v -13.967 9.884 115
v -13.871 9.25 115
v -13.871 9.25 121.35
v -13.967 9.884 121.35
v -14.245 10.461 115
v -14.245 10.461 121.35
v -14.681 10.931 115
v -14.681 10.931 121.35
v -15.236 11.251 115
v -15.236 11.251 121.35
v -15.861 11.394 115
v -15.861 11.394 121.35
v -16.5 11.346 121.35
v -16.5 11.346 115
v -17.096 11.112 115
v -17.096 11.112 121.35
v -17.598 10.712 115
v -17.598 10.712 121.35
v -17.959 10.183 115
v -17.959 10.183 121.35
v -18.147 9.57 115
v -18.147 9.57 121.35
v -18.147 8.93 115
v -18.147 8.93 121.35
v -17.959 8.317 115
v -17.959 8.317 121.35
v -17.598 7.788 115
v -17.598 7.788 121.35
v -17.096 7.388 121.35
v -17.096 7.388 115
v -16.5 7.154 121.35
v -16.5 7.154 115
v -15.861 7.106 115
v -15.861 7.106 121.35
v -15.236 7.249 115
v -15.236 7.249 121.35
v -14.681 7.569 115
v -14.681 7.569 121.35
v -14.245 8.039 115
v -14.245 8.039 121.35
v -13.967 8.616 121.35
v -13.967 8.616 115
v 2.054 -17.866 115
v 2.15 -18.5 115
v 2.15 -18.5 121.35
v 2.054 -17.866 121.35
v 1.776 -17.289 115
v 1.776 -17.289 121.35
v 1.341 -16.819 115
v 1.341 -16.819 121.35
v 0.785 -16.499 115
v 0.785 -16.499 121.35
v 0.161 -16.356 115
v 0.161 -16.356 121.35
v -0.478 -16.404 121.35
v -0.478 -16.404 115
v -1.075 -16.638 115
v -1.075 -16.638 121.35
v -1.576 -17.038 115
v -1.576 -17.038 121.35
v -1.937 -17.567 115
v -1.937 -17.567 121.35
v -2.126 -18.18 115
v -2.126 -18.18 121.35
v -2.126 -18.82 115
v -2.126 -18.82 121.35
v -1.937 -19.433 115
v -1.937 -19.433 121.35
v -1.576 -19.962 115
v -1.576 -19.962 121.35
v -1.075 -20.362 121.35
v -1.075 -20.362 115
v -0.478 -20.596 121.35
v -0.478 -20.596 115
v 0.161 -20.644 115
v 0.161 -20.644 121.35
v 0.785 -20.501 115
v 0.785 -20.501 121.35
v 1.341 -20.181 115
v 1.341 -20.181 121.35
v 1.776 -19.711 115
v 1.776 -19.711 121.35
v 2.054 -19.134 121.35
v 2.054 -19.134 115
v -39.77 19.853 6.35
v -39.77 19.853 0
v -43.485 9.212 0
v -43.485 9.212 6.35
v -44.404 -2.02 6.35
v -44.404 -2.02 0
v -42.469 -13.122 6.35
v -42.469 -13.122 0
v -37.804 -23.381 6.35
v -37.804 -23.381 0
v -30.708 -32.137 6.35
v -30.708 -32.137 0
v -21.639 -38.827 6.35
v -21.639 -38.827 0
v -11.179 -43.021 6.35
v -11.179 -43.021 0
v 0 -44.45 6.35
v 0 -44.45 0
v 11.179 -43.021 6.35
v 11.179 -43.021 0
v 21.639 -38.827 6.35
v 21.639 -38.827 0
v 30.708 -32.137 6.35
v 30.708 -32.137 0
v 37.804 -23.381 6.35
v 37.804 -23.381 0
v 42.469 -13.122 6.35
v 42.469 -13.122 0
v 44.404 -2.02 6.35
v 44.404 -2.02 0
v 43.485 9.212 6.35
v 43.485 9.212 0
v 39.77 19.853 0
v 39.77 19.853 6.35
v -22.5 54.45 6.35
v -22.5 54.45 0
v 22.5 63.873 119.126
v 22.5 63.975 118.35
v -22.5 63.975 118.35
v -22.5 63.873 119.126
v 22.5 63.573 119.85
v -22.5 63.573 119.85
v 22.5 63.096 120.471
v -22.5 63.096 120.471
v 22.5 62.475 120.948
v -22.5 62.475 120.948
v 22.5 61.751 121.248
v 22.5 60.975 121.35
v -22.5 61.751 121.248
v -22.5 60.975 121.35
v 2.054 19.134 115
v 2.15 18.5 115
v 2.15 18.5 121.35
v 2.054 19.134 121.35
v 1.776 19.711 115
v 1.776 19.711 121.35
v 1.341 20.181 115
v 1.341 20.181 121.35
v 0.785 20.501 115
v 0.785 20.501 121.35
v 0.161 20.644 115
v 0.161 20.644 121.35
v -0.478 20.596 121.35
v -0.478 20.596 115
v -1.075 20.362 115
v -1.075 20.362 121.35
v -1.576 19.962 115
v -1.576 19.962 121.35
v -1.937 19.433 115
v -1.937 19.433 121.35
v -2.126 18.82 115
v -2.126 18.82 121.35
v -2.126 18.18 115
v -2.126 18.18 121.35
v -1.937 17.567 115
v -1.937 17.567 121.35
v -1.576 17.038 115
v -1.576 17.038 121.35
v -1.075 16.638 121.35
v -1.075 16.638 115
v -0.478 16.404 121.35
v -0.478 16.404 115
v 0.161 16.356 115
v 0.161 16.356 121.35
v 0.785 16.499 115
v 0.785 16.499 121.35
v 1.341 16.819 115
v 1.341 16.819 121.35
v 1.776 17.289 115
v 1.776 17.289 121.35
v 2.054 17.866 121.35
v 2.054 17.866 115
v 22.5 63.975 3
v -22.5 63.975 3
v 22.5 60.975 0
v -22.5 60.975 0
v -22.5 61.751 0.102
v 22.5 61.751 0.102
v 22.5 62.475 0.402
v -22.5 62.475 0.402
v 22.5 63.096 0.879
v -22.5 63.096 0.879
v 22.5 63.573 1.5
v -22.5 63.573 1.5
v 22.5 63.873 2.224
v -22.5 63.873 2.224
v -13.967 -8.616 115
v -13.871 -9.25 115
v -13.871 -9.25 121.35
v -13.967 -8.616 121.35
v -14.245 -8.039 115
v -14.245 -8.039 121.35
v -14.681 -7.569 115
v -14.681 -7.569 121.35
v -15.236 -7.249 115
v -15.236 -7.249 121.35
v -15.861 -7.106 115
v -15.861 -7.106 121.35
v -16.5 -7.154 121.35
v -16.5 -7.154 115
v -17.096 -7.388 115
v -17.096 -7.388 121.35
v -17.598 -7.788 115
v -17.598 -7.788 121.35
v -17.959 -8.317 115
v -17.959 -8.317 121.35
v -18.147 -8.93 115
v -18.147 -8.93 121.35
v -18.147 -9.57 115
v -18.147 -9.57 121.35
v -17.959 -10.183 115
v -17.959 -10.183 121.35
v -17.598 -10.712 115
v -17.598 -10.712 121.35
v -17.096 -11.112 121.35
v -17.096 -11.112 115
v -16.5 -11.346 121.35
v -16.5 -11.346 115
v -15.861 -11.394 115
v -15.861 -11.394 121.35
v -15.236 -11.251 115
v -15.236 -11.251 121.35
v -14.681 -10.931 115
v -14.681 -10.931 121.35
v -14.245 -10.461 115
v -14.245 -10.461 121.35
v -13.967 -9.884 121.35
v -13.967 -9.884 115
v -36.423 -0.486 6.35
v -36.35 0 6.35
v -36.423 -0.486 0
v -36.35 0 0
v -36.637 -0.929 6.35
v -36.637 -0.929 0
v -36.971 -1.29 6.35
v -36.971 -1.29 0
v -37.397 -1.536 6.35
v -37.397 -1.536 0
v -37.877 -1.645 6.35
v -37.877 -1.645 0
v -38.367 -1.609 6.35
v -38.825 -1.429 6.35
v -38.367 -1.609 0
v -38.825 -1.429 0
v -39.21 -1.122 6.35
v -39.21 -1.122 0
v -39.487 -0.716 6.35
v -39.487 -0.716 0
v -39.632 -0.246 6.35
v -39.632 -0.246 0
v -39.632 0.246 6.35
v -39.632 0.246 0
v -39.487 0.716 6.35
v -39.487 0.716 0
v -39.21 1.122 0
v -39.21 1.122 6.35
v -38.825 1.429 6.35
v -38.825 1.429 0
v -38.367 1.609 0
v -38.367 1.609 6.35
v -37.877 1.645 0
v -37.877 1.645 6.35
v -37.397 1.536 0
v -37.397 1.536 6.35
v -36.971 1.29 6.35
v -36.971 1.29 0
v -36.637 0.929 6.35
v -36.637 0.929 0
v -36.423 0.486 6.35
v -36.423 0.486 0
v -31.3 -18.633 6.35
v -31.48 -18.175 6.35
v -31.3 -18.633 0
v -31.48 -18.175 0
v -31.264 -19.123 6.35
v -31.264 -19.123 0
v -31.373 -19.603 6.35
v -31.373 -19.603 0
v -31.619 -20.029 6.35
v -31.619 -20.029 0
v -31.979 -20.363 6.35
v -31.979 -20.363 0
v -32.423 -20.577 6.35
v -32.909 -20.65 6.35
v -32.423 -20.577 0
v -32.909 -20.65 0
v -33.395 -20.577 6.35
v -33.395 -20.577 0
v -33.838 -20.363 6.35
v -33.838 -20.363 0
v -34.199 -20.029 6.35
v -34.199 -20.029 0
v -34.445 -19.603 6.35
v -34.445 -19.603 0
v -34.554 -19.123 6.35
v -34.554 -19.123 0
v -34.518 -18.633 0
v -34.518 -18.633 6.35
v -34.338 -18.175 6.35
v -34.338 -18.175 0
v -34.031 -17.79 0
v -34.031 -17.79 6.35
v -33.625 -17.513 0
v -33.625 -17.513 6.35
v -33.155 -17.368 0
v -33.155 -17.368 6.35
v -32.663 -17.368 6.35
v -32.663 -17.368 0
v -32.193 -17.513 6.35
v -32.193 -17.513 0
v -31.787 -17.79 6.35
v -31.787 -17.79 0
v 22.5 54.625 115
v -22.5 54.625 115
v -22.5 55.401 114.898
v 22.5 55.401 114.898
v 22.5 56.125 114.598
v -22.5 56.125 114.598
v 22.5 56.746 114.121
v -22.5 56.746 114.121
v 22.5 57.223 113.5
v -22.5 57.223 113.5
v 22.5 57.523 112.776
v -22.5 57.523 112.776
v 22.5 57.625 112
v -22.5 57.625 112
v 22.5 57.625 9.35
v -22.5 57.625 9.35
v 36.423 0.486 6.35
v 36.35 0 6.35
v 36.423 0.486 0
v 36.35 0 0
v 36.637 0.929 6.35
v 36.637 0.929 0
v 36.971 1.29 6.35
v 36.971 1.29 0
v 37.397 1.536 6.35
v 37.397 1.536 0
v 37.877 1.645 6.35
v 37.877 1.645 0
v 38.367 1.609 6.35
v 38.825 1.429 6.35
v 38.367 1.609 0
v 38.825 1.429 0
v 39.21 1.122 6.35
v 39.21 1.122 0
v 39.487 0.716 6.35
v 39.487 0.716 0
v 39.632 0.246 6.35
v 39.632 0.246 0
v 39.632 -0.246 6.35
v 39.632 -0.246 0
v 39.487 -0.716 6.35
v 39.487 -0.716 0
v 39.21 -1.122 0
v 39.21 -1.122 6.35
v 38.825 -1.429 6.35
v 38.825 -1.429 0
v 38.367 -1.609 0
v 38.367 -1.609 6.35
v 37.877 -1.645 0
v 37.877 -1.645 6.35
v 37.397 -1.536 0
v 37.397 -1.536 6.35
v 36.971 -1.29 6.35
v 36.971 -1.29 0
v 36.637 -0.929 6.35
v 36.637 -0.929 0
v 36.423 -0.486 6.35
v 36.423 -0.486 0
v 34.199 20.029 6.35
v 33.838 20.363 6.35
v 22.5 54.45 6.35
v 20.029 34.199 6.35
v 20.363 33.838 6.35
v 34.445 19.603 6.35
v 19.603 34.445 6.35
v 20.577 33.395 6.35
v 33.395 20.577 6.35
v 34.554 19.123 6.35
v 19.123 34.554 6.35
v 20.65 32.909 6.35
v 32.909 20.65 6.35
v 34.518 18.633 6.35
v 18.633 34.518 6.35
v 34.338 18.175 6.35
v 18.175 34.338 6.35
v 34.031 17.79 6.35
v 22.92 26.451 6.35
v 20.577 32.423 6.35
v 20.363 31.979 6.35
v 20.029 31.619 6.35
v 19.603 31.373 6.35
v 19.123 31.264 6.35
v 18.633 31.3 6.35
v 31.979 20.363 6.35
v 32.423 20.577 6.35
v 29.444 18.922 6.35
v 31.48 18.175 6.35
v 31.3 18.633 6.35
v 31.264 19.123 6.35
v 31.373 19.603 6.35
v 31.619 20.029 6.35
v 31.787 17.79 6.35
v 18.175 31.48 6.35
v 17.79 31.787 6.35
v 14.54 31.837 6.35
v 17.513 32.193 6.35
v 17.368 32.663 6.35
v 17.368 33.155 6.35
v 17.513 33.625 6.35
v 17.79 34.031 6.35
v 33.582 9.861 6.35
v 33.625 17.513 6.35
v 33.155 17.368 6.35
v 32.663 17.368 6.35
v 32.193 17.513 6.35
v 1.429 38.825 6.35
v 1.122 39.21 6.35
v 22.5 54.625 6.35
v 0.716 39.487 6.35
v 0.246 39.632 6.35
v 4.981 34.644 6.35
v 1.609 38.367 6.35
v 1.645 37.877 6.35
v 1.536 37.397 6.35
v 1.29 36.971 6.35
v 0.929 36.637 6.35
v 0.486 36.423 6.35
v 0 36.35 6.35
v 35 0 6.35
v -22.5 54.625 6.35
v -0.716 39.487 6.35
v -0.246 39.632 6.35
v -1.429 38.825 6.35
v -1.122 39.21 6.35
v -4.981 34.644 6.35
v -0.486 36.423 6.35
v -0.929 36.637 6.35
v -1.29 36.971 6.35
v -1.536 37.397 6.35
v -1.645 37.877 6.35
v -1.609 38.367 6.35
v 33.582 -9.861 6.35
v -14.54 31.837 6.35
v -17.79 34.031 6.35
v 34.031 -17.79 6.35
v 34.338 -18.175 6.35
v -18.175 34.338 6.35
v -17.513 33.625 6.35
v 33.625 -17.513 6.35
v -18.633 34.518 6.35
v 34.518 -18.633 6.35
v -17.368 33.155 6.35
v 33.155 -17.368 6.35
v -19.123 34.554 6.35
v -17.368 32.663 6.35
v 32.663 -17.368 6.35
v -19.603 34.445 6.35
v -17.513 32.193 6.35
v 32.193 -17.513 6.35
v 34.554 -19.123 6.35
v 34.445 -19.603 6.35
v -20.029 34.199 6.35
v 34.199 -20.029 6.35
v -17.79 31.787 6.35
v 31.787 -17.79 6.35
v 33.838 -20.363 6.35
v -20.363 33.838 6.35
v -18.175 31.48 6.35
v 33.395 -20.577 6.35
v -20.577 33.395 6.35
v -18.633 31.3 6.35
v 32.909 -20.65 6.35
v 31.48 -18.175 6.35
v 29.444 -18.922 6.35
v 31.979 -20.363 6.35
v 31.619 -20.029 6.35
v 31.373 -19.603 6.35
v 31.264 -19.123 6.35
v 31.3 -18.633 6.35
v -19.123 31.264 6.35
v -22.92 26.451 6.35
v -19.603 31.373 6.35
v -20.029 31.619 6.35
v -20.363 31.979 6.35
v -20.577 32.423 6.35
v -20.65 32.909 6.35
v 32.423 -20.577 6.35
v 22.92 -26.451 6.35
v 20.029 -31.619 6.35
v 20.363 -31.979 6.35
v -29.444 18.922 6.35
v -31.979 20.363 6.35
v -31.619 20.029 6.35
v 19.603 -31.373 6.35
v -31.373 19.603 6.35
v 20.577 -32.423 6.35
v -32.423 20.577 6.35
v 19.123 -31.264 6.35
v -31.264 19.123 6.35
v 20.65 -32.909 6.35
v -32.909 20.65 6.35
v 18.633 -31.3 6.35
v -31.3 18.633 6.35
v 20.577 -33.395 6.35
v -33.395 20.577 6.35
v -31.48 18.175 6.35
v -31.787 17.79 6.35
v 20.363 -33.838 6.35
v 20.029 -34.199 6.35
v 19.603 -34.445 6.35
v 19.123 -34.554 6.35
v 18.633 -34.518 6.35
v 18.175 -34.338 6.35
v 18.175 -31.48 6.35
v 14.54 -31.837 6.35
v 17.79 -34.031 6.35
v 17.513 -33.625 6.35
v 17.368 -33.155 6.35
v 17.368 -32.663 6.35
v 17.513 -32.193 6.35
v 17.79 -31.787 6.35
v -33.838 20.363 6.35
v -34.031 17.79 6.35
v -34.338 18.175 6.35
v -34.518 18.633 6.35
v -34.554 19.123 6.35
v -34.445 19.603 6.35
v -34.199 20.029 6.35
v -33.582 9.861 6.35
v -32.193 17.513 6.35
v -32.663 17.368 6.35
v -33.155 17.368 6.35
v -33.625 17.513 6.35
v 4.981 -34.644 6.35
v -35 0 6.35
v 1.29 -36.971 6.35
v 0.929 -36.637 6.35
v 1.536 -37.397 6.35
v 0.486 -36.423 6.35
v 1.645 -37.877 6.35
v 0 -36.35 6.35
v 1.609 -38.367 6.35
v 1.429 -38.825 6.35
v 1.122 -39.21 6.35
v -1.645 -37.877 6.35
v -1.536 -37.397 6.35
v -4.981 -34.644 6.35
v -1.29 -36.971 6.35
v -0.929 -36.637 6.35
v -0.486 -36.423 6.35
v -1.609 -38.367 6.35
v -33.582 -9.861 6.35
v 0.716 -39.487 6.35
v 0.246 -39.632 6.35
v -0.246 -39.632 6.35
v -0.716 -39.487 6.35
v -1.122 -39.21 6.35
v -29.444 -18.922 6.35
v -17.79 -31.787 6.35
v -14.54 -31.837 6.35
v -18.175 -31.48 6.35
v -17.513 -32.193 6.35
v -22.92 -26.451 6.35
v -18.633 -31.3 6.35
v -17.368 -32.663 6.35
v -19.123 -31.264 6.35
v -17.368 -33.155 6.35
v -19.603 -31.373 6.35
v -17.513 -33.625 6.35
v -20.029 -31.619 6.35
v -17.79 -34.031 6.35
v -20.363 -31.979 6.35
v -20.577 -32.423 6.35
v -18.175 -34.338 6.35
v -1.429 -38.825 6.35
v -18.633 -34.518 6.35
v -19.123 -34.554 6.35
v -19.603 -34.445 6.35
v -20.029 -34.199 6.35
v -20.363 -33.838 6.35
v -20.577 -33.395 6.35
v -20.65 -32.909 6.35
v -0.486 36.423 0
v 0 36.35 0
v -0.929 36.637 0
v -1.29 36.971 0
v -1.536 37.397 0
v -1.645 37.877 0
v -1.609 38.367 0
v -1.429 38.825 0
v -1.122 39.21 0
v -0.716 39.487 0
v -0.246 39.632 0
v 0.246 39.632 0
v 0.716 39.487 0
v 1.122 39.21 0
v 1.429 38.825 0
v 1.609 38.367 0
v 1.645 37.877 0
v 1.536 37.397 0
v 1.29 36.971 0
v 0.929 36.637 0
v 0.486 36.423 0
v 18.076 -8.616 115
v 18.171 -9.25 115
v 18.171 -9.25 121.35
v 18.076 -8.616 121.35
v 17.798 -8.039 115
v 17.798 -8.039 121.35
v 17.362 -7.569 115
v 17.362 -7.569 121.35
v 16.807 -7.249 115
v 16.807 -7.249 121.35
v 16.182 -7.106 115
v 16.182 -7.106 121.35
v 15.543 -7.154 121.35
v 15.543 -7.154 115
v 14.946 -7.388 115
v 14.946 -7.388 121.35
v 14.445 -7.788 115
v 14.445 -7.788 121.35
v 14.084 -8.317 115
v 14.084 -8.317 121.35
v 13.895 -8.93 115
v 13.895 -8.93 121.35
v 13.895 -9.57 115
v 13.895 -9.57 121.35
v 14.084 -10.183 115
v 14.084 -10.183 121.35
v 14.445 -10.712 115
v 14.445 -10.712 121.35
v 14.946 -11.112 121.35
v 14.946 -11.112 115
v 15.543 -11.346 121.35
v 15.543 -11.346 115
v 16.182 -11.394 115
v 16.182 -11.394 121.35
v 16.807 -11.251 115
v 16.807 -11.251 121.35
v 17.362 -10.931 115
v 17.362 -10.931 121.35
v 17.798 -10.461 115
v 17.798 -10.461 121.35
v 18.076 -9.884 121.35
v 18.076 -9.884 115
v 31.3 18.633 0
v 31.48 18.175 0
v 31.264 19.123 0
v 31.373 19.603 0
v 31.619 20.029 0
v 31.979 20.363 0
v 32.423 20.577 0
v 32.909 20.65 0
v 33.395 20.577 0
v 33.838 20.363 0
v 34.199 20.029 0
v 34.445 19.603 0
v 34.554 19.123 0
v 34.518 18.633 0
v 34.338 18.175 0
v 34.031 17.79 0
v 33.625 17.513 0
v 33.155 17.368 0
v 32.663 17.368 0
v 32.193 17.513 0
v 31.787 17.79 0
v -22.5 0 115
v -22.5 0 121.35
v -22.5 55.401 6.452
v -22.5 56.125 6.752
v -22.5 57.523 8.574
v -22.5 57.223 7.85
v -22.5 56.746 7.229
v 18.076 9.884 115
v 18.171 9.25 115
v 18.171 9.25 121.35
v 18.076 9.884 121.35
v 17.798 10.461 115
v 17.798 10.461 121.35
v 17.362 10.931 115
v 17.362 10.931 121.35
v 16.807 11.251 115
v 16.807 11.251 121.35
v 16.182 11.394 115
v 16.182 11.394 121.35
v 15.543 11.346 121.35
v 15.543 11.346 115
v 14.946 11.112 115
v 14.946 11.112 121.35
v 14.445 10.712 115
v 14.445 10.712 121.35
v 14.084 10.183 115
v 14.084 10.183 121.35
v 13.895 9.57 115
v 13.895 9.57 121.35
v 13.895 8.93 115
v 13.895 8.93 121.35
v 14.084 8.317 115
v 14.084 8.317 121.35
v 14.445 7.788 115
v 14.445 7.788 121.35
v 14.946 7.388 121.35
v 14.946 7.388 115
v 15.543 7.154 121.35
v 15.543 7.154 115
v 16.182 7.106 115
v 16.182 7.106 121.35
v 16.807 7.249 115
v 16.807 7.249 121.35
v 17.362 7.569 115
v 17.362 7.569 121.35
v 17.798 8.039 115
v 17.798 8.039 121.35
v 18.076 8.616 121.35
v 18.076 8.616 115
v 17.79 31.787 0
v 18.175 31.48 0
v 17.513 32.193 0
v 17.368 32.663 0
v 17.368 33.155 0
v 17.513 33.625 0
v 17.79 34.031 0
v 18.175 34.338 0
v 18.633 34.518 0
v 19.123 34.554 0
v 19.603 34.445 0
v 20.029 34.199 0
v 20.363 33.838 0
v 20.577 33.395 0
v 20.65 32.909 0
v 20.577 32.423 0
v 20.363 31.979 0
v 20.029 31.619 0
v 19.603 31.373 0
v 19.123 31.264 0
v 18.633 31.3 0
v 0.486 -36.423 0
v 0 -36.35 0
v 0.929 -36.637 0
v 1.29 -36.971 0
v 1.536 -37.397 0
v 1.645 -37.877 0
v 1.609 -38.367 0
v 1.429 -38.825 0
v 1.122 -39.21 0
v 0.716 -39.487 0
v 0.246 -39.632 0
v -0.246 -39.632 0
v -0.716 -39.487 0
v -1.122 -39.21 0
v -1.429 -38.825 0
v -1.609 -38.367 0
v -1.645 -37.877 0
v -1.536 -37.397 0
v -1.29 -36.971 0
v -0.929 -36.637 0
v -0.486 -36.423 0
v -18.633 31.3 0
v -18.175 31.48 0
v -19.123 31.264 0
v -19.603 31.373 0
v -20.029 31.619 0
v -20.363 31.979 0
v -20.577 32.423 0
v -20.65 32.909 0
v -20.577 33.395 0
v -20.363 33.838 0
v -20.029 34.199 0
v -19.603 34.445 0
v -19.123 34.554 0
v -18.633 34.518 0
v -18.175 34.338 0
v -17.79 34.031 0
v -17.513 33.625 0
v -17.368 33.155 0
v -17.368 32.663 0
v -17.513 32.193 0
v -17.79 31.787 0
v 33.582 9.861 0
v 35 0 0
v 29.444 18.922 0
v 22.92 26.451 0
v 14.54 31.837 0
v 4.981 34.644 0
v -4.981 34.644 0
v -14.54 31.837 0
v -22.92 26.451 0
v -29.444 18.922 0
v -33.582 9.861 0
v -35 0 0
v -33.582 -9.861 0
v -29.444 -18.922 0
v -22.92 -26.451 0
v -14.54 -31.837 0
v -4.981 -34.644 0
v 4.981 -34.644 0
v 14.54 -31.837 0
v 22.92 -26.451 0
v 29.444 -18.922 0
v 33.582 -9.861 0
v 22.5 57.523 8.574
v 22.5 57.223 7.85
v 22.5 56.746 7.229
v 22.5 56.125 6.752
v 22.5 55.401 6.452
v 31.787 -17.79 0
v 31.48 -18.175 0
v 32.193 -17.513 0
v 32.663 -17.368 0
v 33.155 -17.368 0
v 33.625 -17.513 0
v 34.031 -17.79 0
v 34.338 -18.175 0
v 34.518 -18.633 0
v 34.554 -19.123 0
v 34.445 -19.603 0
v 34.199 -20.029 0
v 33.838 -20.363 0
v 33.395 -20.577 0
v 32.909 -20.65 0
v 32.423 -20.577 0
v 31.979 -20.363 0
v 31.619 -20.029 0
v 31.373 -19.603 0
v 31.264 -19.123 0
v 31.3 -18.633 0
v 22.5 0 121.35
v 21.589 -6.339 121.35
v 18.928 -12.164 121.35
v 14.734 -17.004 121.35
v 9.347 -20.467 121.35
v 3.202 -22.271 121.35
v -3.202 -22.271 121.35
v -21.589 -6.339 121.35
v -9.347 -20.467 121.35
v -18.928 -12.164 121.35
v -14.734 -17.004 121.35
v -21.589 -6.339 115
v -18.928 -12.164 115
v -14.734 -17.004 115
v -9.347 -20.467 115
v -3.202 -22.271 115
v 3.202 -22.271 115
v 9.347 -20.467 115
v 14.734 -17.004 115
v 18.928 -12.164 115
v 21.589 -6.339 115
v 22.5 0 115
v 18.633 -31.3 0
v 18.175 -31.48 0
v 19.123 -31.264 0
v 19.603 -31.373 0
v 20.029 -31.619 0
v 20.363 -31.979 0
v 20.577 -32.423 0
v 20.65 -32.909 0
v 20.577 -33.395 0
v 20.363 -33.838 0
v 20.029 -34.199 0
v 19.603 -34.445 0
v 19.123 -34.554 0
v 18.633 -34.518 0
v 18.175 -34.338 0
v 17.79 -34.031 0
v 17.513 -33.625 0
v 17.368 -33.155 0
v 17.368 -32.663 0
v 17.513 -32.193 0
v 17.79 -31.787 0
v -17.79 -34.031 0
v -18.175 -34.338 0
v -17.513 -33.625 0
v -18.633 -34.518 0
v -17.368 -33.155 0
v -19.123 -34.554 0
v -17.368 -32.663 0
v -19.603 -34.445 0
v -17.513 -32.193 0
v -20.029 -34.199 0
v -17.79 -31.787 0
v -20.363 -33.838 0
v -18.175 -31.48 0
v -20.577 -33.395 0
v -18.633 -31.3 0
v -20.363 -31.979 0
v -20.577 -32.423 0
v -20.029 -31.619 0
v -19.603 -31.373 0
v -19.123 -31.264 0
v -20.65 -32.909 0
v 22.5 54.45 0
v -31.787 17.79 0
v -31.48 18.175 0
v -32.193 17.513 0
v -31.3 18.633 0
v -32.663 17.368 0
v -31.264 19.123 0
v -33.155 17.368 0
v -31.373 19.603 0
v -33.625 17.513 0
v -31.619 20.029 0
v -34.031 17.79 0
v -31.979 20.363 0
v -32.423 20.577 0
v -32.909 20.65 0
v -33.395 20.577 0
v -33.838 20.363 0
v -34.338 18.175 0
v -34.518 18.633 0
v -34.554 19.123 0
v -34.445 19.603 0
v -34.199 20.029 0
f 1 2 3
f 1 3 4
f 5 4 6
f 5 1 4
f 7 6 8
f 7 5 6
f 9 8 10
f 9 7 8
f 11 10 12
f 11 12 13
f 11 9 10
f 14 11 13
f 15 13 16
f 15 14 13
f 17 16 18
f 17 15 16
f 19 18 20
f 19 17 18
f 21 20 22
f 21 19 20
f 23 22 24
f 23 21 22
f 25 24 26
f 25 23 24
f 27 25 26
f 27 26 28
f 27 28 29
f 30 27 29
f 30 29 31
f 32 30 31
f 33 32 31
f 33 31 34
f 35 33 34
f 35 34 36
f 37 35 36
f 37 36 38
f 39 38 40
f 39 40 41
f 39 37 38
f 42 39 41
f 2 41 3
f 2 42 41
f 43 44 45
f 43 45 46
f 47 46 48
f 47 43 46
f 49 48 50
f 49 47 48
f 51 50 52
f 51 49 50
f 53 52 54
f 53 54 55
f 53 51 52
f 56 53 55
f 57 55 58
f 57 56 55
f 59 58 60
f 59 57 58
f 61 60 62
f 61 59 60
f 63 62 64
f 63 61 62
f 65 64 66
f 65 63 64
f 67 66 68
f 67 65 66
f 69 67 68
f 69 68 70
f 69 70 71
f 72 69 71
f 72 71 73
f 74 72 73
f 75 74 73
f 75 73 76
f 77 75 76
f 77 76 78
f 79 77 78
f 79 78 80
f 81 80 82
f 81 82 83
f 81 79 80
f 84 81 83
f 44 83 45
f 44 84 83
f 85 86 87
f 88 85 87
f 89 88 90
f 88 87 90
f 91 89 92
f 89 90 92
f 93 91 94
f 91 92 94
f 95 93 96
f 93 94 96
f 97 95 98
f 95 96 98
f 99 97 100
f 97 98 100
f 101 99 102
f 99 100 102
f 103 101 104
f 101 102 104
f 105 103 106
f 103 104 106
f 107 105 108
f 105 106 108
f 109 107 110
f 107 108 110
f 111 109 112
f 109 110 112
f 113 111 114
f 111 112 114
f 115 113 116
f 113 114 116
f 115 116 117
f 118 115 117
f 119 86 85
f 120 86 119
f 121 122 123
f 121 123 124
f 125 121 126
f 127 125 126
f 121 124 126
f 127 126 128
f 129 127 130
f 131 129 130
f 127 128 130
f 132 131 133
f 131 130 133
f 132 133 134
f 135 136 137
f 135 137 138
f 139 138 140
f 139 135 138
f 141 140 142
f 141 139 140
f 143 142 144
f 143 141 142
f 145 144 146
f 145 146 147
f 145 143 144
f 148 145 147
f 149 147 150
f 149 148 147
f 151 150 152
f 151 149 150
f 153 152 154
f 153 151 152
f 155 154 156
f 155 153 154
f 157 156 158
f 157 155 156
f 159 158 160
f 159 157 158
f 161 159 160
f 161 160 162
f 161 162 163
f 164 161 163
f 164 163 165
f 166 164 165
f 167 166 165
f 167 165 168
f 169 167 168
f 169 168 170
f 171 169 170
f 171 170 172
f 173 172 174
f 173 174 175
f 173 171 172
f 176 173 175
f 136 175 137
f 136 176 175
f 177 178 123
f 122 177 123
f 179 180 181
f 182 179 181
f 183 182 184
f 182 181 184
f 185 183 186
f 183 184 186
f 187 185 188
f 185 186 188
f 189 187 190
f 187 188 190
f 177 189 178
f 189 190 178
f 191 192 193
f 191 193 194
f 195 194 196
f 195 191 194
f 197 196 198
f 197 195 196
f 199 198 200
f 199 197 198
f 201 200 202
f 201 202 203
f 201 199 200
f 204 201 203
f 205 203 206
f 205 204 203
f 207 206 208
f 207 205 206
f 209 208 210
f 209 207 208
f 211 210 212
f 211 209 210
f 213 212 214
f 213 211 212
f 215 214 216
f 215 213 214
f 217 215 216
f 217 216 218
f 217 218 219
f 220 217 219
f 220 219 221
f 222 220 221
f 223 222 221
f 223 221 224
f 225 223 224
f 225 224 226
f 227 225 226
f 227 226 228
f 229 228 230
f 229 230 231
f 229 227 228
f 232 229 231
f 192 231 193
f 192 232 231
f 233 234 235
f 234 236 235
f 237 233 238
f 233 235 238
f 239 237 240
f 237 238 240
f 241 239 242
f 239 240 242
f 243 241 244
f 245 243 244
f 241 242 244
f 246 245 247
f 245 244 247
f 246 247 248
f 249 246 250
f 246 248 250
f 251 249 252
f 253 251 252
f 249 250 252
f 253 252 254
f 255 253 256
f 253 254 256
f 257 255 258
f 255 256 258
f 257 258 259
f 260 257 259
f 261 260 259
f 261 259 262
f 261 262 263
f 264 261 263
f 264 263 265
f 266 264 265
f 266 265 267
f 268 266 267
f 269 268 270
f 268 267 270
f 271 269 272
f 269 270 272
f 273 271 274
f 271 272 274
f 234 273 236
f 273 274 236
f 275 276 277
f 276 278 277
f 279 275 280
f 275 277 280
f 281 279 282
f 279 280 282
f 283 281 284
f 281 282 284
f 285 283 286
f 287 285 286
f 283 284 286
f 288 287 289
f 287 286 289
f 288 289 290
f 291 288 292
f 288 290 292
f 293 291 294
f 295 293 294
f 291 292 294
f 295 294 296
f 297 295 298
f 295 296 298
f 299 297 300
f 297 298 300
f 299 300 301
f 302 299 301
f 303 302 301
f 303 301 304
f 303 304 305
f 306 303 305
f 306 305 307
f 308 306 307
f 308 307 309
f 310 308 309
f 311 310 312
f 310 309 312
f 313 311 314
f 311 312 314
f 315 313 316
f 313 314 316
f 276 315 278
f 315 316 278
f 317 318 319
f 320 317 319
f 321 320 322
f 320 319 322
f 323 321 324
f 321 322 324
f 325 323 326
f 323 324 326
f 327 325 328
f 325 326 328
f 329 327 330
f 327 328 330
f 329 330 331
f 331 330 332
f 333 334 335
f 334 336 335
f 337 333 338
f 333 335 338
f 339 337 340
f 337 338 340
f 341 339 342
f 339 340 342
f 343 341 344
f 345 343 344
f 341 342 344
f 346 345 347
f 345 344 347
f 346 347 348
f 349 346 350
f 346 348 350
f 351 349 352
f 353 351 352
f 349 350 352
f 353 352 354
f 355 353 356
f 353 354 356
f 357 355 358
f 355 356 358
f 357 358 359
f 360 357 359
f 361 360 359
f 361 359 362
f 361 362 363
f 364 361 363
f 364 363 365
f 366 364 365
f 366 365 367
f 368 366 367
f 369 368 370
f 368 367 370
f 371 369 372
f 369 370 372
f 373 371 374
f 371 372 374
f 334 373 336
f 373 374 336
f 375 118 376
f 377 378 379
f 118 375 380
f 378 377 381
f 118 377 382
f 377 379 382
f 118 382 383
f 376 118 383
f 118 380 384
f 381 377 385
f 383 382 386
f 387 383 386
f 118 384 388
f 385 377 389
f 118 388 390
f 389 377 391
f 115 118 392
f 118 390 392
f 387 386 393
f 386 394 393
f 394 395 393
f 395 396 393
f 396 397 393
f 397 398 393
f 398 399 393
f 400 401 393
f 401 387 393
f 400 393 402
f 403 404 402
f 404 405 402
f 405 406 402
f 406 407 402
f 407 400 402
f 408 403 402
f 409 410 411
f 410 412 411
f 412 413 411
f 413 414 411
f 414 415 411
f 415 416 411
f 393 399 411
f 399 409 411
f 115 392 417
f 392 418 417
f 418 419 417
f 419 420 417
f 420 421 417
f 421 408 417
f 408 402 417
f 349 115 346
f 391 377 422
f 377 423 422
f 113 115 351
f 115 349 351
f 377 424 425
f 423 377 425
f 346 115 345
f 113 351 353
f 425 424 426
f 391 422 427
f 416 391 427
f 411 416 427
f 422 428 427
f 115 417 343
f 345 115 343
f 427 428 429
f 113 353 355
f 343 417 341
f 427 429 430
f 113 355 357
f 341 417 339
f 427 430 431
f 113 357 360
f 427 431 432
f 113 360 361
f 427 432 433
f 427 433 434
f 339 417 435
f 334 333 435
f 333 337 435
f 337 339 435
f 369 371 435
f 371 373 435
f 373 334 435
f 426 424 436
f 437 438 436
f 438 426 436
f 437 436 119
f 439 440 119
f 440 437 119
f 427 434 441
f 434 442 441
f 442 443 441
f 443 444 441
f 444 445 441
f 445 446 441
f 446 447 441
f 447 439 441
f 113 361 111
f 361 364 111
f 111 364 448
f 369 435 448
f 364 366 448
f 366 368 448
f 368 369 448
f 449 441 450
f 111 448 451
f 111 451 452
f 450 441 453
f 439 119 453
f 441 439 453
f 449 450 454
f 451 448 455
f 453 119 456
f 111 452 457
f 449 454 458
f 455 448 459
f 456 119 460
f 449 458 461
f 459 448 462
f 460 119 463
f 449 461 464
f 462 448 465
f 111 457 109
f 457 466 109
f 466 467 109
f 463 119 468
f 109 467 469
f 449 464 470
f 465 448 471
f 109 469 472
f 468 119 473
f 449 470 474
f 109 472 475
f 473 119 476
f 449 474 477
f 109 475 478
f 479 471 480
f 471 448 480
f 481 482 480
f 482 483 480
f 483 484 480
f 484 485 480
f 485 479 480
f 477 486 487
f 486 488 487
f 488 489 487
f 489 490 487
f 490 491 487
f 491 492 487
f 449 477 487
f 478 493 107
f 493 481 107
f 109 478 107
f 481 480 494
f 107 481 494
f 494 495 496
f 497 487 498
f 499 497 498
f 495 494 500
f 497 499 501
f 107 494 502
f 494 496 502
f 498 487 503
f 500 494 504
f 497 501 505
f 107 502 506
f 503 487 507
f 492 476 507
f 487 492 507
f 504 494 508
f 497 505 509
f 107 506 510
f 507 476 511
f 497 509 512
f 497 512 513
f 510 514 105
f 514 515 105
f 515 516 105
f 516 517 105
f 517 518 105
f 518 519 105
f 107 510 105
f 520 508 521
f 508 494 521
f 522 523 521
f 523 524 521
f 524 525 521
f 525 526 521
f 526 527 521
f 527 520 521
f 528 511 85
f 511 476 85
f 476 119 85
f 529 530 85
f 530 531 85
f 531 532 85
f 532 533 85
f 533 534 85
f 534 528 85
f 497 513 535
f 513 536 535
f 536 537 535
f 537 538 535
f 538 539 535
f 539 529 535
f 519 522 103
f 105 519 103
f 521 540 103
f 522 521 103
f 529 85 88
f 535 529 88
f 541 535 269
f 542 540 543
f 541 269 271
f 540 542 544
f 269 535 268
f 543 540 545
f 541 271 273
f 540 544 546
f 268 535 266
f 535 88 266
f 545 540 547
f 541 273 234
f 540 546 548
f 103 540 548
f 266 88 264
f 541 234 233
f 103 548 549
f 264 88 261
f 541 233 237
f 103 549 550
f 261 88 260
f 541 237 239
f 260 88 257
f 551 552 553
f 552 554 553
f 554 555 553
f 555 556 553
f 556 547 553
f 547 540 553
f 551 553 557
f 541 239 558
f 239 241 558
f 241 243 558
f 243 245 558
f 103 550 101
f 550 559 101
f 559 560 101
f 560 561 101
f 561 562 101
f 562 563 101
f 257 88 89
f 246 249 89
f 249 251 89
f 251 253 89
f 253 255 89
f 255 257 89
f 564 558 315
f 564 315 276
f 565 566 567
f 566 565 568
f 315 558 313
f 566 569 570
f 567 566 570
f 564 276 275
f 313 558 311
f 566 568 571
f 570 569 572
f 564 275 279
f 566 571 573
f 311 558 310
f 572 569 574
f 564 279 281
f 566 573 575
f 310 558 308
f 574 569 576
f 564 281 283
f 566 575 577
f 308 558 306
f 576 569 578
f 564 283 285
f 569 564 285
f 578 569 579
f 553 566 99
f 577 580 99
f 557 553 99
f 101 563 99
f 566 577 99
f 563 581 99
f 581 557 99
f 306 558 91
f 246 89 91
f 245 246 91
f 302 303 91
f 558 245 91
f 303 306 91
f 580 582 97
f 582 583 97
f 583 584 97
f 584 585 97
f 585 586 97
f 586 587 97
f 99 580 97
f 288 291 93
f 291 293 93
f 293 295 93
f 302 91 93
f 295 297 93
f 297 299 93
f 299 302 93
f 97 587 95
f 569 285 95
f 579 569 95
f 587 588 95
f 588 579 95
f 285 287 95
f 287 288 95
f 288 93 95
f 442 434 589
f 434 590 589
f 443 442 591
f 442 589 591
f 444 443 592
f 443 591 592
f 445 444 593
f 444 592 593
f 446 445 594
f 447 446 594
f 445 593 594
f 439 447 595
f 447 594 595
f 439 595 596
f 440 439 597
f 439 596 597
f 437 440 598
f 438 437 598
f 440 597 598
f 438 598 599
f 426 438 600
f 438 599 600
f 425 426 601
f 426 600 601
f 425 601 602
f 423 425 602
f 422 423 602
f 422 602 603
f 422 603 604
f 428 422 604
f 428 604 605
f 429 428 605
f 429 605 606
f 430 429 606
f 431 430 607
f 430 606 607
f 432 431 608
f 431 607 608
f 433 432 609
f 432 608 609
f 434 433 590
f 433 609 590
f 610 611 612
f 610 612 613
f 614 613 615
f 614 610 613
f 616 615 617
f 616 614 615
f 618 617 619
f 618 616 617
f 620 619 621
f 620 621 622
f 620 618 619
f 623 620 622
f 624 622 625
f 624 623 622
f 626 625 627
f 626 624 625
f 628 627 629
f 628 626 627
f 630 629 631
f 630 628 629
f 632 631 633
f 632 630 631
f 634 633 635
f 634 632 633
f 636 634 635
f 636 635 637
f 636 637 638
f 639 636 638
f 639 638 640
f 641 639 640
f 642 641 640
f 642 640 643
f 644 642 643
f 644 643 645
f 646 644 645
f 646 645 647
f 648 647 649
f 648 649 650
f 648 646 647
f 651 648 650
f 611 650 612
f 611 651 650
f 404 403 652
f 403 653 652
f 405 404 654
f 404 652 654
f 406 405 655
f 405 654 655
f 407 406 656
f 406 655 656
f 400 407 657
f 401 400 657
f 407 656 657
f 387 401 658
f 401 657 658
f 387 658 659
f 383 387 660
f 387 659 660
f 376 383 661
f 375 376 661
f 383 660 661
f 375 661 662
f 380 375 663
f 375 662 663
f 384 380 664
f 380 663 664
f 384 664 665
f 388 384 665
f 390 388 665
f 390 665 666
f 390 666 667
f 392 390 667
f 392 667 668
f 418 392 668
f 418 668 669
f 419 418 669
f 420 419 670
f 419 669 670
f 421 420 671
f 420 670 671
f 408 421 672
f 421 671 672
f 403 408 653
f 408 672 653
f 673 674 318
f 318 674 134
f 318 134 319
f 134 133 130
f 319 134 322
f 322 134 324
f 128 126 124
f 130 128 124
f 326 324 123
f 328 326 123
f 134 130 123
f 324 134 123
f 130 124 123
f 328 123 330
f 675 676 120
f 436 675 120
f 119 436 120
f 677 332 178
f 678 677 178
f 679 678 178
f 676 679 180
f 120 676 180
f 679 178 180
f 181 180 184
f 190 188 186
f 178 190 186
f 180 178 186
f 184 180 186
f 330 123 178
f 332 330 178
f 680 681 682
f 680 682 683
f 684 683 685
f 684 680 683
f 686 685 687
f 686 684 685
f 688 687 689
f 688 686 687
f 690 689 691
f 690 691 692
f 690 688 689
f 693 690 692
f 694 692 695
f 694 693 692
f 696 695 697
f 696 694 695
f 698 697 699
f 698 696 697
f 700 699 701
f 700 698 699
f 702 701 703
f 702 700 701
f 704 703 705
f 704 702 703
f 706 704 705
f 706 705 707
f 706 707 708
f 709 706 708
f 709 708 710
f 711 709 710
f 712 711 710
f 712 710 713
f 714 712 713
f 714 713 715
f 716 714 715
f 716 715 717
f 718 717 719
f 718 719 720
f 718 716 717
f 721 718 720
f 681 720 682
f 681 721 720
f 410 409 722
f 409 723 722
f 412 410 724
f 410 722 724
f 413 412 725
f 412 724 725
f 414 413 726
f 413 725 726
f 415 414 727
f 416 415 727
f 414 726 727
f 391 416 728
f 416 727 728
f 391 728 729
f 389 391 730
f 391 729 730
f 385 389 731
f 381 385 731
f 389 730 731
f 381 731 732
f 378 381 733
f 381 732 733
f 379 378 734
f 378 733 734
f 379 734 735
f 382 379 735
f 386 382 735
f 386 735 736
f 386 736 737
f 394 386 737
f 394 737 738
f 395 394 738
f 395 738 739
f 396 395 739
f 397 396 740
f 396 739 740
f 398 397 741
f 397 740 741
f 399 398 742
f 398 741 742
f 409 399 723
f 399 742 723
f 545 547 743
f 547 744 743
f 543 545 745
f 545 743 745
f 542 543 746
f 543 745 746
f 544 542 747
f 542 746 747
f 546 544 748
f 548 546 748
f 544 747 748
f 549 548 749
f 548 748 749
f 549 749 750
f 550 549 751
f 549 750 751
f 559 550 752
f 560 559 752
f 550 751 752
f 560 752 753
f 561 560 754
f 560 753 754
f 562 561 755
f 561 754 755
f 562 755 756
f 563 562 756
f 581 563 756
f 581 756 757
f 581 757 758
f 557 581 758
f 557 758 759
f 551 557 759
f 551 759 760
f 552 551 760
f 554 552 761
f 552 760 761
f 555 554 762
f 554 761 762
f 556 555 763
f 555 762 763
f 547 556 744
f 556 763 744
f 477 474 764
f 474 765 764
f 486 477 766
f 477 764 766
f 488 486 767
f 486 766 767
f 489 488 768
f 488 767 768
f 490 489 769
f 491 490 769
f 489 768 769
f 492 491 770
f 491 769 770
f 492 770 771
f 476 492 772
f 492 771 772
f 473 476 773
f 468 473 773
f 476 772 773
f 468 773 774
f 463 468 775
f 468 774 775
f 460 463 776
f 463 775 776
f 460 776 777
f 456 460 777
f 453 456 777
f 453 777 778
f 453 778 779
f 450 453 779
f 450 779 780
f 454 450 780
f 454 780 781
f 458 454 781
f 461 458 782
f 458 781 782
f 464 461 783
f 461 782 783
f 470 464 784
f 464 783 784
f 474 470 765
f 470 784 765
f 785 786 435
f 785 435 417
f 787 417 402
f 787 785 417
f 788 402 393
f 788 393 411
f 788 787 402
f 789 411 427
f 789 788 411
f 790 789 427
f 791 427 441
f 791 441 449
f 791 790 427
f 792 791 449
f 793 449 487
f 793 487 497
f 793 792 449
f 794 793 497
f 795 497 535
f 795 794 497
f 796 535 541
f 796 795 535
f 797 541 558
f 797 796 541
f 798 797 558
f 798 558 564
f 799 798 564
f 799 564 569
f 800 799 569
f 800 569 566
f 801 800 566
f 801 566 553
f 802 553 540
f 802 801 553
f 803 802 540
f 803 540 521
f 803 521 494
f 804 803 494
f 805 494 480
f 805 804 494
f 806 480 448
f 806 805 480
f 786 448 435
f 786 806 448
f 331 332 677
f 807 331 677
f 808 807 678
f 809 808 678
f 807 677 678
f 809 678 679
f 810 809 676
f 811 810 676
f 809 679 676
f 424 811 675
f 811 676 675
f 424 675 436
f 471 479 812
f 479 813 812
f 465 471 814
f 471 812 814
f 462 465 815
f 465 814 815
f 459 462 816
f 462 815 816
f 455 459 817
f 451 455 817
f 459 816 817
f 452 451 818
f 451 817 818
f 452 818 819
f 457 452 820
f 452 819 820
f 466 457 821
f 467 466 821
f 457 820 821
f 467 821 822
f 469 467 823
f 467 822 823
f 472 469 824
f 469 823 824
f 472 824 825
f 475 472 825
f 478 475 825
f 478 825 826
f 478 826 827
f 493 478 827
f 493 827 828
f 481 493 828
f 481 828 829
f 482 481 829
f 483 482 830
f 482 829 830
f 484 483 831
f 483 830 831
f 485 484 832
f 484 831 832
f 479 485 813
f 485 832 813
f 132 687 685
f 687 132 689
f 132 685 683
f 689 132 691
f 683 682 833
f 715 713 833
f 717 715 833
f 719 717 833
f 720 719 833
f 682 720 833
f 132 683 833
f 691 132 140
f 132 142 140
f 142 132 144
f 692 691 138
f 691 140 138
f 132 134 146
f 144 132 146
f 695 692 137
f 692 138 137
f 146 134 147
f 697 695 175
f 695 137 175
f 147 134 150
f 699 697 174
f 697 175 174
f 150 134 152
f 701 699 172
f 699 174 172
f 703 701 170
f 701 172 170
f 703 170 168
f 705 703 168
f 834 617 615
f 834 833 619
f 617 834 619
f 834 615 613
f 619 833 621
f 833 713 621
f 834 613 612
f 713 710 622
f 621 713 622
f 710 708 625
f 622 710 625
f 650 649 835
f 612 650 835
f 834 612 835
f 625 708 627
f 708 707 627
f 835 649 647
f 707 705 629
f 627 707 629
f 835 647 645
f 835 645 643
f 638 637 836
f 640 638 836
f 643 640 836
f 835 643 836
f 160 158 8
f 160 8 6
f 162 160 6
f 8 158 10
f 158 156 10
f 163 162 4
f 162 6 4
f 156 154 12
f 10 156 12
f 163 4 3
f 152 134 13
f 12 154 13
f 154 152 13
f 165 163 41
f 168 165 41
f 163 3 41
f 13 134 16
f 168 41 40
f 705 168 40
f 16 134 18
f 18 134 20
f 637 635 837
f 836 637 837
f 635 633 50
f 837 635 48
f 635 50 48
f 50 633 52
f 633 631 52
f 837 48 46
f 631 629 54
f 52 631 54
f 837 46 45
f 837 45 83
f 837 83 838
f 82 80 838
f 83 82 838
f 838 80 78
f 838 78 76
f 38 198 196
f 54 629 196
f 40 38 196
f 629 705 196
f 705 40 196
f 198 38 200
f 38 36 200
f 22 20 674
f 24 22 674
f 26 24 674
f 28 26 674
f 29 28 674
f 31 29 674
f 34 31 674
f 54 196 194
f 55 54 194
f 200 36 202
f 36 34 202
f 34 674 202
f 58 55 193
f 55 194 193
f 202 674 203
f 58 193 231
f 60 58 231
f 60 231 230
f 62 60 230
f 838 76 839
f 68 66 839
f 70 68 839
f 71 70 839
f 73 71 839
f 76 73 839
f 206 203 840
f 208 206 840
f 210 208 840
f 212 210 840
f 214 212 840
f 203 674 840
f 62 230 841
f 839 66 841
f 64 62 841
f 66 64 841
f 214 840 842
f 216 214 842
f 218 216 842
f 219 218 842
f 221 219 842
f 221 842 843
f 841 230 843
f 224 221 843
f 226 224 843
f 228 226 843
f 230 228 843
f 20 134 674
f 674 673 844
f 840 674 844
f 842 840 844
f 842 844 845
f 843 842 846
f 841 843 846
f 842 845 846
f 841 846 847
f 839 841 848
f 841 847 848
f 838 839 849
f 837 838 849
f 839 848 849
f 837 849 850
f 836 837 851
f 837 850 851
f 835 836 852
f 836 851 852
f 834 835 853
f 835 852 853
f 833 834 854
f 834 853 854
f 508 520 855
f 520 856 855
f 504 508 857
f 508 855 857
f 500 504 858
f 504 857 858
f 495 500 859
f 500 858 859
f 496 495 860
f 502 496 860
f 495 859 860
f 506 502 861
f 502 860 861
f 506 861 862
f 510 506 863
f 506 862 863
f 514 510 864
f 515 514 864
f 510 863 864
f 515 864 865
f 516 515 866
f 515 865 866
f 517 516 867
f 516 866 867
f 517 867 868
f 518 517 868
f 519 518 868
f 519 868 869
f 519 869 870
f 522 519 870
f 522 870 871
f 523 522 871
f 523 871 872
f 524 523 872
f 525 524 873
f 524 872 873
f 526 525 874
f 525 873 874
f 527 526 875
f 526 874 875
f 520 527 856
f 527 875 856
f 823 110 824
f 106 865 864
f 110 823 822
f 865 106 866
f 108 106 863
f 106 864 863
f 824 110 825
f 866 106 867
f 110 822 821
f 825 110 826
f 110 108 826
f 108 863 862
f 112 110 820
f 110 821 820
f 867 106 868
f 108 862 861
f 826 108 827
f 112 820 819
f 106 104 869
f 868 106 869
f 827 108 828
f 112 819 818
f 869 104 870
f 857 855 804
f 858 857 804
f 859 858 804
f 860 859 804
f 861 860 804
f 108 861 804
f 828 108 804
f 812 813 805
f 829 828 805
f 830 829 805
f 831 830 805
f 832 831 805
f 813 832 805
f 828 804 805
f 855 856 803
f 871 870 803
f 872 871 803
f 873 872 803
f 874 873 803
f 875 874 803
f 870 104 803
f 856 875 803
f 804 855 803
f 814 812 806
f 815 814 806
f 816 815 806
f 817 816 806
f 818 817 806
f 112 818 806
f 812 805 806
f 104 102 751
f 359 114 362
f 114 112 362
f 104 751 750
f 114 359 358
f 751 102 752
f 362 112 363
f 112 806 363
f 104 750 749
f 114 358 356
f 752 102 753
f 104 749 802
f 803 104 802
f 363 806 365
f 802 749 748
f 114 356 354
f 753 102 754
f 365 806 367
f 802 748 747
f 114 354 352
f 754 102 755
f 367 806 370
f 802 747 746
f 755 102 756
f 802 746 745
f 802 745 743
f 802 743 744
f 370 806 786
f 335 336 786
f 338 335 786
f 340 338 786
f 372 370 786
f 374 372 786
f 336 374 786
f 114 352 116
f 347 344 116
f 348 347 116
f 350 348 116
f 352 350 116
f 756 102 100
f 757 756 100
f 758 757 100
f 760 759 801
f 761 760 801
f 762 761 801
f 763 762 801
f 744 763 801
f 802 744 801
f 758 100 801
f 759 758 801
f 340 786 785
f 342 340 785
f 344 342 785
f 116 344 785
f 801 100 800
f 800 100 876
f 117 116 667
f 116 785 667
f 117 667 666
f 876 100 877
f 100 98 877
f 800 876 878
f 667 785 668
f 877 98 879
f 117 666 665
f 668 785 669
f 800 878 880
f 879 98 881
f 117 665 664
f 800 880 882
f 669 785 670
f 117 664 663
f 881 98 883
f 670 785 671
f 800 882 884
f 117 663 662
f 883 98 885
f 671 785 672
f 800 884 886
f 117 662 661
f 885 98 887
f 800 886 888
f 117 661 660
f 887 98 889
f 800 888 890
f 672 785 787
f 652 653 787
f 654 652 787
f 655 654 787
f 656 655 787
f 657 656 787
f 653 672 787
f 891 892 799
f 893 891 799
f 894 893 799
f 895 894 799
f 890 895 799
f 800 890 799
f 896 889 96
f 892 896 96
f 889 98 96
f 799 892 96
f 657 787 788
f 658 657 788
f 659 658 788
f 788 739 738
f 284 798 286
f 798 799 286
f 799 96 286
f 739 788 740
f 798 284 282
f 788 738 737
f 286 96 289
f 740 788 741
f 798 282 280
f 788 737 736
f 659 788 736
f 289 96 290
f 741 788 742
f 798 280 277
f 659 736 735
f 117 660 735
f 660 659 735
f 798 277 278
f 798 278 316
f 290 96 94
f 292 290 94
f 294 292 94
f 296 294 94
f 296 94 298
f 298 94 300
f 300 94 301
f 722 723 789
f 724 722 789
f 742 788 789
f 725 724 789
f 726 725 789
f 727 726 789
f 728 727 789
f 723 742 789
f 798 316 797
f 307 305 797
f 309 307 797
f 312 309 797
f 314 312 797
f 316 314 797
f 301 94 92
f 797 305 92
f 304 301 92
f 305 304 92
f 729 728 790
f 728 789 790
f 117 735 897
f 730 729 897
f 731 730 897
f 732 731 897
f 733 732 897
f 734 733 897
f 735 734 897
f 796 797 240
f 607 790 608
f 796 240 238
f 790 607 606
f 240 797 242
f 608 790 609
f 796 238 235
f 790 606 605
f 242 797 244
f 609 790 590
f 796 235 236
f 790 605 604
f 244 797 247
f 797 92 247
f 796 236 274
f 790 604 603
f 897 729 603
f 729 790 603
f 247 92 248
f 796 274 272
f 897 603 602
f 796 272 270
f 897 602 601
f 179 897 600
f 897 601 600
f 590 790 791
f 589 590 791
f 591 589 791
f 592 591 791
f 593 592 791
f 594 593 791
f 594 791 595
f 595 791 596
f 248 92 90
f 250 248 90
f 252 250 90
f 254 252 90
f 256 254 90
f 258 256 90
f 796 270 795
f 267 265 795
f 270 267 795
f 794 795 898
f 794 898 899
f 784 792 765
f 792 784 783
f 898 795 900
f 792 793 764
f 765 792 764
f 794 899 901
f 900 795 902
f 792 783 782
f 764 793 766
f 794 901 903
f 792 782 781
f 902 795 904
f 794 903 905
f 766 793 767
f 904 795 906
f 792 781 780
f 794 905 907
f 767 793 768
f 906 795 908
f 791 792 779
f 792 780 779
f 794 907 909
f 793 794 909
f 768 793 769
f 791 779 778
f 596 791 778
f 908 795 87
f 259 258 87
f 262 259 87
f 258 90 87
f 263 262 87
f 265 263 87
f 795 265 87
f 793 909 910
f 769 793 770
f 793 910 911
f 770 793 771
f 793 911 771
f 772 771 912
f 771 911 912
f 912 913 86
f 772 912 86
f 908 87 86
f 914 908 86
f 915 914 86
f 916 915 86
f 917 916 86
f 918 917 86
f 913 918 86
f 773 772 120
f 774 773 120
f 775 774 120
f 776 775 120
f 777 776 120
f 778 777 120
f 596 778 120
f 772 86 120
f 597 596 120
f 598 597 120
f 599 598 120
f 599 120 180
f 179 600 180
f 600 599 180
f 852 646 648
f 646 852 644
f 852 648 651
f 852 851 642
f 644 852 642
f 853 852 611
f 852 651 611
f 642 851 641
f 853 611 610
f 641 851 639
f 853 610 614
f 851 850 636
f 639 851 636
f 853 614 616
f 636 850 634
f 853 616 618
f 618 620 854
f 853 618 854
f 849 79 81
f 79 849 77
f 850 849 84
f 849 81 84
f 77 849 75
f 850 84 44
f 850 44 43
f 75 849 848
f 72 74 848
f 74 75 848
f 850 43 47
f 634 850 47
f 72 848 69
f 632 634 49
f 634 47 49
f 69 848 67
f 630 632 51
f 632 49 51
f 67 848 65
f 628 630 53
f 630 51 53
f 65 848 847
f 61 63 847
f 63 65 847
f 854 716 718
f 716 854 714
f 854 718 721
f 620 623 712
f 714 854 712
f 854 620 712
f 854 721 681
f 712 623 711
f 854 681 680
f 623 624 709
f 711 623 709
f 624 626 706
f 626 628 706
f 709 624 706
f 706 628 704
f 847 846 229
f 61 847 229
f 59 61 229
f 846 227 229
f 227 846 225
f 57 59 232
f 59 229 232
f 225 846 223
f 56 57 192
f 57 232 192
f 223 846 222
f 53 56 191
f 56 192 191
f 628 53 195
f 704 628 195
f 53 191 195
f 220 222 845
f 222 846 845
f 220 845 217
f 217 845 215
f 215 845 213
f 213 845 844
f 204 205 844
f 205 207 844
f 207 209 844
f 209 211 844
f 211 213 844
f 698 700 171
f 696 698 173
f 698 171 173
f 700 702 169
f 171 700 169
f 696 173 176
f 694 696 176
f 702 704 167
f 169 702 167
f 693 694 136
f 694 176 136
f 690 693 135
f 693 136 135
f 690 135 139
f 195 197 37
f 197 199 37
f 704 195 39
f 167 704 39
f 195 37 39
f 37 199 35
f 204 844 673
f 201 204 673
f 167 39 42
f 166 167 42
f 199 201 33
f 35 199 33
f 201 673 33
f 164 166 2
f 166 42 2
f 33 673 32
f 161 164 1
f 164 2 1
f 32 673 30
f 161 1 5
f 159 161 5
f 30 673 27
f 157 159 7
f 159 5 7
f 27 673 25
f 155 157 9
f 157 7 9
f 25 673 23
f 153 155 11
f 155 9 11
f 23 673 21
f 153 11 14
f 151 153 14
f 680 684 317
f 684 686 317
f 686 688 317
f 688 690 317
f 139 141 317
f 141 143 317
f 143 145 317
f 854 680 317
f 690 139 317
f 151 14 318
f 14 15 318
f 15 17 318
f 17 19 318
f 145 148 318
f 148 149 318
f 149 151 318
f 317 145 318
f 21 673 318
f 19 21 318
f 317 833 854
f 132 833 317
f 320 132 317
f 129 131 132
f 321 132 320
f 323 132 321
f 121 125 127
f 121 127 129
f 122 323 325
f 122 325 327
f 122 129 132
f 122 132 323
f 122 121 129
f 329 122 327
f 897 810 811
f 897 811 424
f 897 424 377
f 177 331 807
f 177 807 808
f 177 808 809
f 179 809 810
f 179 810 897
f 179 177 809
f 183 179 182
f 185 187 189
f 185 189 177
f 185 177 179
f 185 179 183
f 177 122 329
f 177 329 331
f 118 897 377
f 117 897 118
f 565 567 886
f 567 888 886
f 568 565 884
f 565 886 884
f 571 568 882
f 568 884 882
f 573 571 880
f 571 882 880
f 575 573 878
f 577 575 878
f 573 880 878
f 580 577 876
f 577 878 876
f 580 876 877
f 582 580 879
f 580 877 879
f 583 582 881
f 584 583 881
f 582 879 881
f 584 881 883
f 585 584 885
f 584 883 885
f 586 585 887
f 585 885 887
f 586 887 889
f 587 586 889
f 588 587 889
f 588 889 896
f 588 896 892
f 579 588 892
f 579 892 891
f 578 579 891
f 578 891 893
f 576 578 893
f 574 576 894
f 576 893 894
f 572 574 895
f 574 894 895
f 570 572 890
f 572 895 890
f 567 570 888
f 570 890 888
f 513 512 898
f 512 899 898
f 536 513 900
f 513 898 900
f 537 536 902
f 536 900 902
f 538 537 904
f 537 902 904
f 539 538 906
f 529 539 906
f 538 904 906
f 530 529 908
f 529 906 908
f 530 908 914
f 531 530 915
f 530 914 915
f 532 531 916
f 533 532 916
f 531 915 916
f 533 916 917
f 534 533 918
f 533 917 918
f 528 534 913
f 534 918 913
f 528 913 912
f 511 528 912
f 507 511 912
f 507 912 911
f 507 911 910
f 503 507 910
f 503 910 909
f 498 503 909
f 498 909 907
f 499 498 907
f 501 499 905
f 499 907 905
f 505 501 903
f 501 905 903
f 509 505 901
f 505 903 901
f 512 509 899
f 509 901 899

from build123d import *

# Parameters (mm, degrees)
BOSS_EXTRUDE1_START      = 115
SKETCH2_R                = 22.5
SKETCH2_R_2              = 2.15
BOSS_EXTRUDE1_DEPTH      = 6.35
SKETCH2_4_R              = 44.45
SKETCH2_4_R_2            = 35
BOSS_EXTRUDE2_DEPTH      = 6.35
SKETCH3_W                = 1.65
SKETCH3_H                = 6.35
CIRPATTERN1_COUNT        = 12
BOSS_EXTRUDE3_DEPTH      = 6.35
BOSS_EXTRUDE4_START      = 115
BOSS_EXTRUDE4_DEPTH      = 6.35
BOSS_EXTRUDE5_DEPTH      = 22.5
BOSS_EXTRUDE5_DEPTH_BACK = 22.5


with BuildPart() as part:
    # Sketch2 → Boss-Extrude1 (new body)
    with BuildSketch(Plane.XY.offset(BOSS_EXTRUDE1_START)):
        Circle(SKETCH2_R)
        with Locations((0, 18.5)):
            Circle(SKETCH2_R_2, mode=Mode.SUBTRACT)
        with Locations((16.02146997, 9.25)):
            Circle(SKETCH2_R_2, mode=Mode.SUBTRACT)
        with Locations((16.02146997, -9.25)):
            Circle(SKETCH2_R_2, mode=Mode.SUBTRACT)
        with Locations((-16.02146997, 9.25)):
            Circle(SKETCH2_R_2, mode=Mode.SUBTRACT)
        with Locations((-16.02146997, -9.25)):
            Circle(SKETCH2_R_2, mode=Mode.SUBTRACT)
        with Locations((0, -18.5)):
            Circle(SKETCH2_R_2, mode=Mode.SUBTRACT)
    extrude(amount=BOSS_EXTRUDE1_DEPTH)

    # Sketch4<4> → Boss-Extrude4 (add)
    with BuildSketch(Plane.XY.offset(BOSS_EXTRUDE4_START)):
        with BuildLine():
            Line((-22.5, 54.45), (-22.5, 38.334742728))
            ThreePointArc((-22.5, 38.334742728), (0, 44.45), (22.5, 38.334742728))
            Line((22.5, 38.334742728), (22.5, 54.45))
            Line((22.5, 54.45), (-22.5, 54.45))
        make_face()
        with BuildLine():
            Line((-22.5, 38.334742728), (-22.5, 0))
            ThreePointArc((-22.5, 0), (0, 22.5), (22.5, 0))
            Line((22.5, 0), (22.5, 38.334742728))
            ThreePointArc((22.5, 38.334742728), (0, 44.45), (-22.5, 38.334742728))
        make_face()
    extrude(amount=BOSS_EXTRUDE4_DEPTH)



with BuildPart() as body_2:
    # Sketch2<4> → Boss-Extrude2 (new body)
    with BuildSketch(Plane.XY):
        Circle(SKETCH2_4_R)
        Circle(SKETCH2_4_R_2, mode=Mode.SUBTRACT)
    extrude(amount=BOSS_EXTRUDE2_DEPTH)

    # Sketch3 → M4x0.7 Tapped Hole1 (revolve, cut)
    with BuildSketch(Plane(origin=(0, 38, 6.35), x_dir=(0, -1, 0), z_dir=(1, 0, 0))):
        with Locations((0.825, 3.175)):
            Rectangle(SKETCH3_W, SKETCH3_H)
    m4x0_7_tapped_hole1 = revolve(axis=Axis((0, 38, 12.7), (0, 0, -1)), mode=Mode.SUBTRACT)

    # CirPattern1: M4x0.7 Tapped Hole1 ×12 about axis
    cirpattern1_axis = Axis((0, 0, 0), (0, 0, 1))
    for i in range(1, CIRPATTERN1_COUNT):
        add(m4x0_7_tapped_hole1.rotate(cirpattern1_axis, i * 360 / CIRPATTERN1_COUNT), mode=Mode.SUBTRACT)

    # Sketch4 → Boss-Extrude3 (add)
    with BuildSketch(Plane.XY):
        with BuildLine():
            Line((-39.770338523, 19.852523108), (-22.5, 54.45))
            Line((-22.5, 54.45), (22.5, 54.45))
            Line((22.5, 54.45), (39.770338523, 19.852523108))
            ThreePointArc((39.770338523, 19.852523108), (0, 44.45), (-39.770338523, 19.852523108))
        make_face()
    extrude(amount=BOSS_EXTRUDE3_DEPTH)


with BuildPart() as part_1:
    add(part.part)

    add(body_2.part)  # Boss-Extrude5 merges body 2
    # Sketch5 → Boss-Extrude5 (add, two sides: drawn at the far end of the back side and taken through both)
    with BuildSketch(Plane(origin=(0, 0, 0), x_dir=(0, 0, -1), z_dir=(1, 0, 0)).offset(-BOSS_EXTRUDE5_DEPTH_BACK)):
        with BuildLine():
            Line((0, 54.45), (0, 60.975))
            ThreePointArc((0, 60.975), (-0.878679656, 63.096320344), (-3, 63.975))
            Line((-3, 63.975), (-118.35, 63.975))
            ThreePointArc((-118.35, 63.975), (-120.471320344, 63.096320344), (-121.35, 60.975))
            Line((-121.35, 60.975), (-121.35, 54.45))
            Line((-121.35, 54.45), (-115, 54.45))
            Line((-115, 54.45), (-115, 54.625))
            ThreePointArc((-115, 54.625), (-114.121320344, 56.746320344), (-112, 57.625))
            Line((-112, 57.625), (-9.35, 57.625))
            ThreePointArc((-9.35, 57.625), (-7.228679656, 56.746320344), (-6.35, 54.625))
            Line((-6.35, 54.625), (-6.35, 54.45))
            Line((-6.35, 54.45), (0, 54.45))
        make_face()
    extrude(amount=BOSS_EXTRUDE5_DEPTH + BOSS_EXTRUDE5_DEPTH_BACK)


solid = part_1.part
